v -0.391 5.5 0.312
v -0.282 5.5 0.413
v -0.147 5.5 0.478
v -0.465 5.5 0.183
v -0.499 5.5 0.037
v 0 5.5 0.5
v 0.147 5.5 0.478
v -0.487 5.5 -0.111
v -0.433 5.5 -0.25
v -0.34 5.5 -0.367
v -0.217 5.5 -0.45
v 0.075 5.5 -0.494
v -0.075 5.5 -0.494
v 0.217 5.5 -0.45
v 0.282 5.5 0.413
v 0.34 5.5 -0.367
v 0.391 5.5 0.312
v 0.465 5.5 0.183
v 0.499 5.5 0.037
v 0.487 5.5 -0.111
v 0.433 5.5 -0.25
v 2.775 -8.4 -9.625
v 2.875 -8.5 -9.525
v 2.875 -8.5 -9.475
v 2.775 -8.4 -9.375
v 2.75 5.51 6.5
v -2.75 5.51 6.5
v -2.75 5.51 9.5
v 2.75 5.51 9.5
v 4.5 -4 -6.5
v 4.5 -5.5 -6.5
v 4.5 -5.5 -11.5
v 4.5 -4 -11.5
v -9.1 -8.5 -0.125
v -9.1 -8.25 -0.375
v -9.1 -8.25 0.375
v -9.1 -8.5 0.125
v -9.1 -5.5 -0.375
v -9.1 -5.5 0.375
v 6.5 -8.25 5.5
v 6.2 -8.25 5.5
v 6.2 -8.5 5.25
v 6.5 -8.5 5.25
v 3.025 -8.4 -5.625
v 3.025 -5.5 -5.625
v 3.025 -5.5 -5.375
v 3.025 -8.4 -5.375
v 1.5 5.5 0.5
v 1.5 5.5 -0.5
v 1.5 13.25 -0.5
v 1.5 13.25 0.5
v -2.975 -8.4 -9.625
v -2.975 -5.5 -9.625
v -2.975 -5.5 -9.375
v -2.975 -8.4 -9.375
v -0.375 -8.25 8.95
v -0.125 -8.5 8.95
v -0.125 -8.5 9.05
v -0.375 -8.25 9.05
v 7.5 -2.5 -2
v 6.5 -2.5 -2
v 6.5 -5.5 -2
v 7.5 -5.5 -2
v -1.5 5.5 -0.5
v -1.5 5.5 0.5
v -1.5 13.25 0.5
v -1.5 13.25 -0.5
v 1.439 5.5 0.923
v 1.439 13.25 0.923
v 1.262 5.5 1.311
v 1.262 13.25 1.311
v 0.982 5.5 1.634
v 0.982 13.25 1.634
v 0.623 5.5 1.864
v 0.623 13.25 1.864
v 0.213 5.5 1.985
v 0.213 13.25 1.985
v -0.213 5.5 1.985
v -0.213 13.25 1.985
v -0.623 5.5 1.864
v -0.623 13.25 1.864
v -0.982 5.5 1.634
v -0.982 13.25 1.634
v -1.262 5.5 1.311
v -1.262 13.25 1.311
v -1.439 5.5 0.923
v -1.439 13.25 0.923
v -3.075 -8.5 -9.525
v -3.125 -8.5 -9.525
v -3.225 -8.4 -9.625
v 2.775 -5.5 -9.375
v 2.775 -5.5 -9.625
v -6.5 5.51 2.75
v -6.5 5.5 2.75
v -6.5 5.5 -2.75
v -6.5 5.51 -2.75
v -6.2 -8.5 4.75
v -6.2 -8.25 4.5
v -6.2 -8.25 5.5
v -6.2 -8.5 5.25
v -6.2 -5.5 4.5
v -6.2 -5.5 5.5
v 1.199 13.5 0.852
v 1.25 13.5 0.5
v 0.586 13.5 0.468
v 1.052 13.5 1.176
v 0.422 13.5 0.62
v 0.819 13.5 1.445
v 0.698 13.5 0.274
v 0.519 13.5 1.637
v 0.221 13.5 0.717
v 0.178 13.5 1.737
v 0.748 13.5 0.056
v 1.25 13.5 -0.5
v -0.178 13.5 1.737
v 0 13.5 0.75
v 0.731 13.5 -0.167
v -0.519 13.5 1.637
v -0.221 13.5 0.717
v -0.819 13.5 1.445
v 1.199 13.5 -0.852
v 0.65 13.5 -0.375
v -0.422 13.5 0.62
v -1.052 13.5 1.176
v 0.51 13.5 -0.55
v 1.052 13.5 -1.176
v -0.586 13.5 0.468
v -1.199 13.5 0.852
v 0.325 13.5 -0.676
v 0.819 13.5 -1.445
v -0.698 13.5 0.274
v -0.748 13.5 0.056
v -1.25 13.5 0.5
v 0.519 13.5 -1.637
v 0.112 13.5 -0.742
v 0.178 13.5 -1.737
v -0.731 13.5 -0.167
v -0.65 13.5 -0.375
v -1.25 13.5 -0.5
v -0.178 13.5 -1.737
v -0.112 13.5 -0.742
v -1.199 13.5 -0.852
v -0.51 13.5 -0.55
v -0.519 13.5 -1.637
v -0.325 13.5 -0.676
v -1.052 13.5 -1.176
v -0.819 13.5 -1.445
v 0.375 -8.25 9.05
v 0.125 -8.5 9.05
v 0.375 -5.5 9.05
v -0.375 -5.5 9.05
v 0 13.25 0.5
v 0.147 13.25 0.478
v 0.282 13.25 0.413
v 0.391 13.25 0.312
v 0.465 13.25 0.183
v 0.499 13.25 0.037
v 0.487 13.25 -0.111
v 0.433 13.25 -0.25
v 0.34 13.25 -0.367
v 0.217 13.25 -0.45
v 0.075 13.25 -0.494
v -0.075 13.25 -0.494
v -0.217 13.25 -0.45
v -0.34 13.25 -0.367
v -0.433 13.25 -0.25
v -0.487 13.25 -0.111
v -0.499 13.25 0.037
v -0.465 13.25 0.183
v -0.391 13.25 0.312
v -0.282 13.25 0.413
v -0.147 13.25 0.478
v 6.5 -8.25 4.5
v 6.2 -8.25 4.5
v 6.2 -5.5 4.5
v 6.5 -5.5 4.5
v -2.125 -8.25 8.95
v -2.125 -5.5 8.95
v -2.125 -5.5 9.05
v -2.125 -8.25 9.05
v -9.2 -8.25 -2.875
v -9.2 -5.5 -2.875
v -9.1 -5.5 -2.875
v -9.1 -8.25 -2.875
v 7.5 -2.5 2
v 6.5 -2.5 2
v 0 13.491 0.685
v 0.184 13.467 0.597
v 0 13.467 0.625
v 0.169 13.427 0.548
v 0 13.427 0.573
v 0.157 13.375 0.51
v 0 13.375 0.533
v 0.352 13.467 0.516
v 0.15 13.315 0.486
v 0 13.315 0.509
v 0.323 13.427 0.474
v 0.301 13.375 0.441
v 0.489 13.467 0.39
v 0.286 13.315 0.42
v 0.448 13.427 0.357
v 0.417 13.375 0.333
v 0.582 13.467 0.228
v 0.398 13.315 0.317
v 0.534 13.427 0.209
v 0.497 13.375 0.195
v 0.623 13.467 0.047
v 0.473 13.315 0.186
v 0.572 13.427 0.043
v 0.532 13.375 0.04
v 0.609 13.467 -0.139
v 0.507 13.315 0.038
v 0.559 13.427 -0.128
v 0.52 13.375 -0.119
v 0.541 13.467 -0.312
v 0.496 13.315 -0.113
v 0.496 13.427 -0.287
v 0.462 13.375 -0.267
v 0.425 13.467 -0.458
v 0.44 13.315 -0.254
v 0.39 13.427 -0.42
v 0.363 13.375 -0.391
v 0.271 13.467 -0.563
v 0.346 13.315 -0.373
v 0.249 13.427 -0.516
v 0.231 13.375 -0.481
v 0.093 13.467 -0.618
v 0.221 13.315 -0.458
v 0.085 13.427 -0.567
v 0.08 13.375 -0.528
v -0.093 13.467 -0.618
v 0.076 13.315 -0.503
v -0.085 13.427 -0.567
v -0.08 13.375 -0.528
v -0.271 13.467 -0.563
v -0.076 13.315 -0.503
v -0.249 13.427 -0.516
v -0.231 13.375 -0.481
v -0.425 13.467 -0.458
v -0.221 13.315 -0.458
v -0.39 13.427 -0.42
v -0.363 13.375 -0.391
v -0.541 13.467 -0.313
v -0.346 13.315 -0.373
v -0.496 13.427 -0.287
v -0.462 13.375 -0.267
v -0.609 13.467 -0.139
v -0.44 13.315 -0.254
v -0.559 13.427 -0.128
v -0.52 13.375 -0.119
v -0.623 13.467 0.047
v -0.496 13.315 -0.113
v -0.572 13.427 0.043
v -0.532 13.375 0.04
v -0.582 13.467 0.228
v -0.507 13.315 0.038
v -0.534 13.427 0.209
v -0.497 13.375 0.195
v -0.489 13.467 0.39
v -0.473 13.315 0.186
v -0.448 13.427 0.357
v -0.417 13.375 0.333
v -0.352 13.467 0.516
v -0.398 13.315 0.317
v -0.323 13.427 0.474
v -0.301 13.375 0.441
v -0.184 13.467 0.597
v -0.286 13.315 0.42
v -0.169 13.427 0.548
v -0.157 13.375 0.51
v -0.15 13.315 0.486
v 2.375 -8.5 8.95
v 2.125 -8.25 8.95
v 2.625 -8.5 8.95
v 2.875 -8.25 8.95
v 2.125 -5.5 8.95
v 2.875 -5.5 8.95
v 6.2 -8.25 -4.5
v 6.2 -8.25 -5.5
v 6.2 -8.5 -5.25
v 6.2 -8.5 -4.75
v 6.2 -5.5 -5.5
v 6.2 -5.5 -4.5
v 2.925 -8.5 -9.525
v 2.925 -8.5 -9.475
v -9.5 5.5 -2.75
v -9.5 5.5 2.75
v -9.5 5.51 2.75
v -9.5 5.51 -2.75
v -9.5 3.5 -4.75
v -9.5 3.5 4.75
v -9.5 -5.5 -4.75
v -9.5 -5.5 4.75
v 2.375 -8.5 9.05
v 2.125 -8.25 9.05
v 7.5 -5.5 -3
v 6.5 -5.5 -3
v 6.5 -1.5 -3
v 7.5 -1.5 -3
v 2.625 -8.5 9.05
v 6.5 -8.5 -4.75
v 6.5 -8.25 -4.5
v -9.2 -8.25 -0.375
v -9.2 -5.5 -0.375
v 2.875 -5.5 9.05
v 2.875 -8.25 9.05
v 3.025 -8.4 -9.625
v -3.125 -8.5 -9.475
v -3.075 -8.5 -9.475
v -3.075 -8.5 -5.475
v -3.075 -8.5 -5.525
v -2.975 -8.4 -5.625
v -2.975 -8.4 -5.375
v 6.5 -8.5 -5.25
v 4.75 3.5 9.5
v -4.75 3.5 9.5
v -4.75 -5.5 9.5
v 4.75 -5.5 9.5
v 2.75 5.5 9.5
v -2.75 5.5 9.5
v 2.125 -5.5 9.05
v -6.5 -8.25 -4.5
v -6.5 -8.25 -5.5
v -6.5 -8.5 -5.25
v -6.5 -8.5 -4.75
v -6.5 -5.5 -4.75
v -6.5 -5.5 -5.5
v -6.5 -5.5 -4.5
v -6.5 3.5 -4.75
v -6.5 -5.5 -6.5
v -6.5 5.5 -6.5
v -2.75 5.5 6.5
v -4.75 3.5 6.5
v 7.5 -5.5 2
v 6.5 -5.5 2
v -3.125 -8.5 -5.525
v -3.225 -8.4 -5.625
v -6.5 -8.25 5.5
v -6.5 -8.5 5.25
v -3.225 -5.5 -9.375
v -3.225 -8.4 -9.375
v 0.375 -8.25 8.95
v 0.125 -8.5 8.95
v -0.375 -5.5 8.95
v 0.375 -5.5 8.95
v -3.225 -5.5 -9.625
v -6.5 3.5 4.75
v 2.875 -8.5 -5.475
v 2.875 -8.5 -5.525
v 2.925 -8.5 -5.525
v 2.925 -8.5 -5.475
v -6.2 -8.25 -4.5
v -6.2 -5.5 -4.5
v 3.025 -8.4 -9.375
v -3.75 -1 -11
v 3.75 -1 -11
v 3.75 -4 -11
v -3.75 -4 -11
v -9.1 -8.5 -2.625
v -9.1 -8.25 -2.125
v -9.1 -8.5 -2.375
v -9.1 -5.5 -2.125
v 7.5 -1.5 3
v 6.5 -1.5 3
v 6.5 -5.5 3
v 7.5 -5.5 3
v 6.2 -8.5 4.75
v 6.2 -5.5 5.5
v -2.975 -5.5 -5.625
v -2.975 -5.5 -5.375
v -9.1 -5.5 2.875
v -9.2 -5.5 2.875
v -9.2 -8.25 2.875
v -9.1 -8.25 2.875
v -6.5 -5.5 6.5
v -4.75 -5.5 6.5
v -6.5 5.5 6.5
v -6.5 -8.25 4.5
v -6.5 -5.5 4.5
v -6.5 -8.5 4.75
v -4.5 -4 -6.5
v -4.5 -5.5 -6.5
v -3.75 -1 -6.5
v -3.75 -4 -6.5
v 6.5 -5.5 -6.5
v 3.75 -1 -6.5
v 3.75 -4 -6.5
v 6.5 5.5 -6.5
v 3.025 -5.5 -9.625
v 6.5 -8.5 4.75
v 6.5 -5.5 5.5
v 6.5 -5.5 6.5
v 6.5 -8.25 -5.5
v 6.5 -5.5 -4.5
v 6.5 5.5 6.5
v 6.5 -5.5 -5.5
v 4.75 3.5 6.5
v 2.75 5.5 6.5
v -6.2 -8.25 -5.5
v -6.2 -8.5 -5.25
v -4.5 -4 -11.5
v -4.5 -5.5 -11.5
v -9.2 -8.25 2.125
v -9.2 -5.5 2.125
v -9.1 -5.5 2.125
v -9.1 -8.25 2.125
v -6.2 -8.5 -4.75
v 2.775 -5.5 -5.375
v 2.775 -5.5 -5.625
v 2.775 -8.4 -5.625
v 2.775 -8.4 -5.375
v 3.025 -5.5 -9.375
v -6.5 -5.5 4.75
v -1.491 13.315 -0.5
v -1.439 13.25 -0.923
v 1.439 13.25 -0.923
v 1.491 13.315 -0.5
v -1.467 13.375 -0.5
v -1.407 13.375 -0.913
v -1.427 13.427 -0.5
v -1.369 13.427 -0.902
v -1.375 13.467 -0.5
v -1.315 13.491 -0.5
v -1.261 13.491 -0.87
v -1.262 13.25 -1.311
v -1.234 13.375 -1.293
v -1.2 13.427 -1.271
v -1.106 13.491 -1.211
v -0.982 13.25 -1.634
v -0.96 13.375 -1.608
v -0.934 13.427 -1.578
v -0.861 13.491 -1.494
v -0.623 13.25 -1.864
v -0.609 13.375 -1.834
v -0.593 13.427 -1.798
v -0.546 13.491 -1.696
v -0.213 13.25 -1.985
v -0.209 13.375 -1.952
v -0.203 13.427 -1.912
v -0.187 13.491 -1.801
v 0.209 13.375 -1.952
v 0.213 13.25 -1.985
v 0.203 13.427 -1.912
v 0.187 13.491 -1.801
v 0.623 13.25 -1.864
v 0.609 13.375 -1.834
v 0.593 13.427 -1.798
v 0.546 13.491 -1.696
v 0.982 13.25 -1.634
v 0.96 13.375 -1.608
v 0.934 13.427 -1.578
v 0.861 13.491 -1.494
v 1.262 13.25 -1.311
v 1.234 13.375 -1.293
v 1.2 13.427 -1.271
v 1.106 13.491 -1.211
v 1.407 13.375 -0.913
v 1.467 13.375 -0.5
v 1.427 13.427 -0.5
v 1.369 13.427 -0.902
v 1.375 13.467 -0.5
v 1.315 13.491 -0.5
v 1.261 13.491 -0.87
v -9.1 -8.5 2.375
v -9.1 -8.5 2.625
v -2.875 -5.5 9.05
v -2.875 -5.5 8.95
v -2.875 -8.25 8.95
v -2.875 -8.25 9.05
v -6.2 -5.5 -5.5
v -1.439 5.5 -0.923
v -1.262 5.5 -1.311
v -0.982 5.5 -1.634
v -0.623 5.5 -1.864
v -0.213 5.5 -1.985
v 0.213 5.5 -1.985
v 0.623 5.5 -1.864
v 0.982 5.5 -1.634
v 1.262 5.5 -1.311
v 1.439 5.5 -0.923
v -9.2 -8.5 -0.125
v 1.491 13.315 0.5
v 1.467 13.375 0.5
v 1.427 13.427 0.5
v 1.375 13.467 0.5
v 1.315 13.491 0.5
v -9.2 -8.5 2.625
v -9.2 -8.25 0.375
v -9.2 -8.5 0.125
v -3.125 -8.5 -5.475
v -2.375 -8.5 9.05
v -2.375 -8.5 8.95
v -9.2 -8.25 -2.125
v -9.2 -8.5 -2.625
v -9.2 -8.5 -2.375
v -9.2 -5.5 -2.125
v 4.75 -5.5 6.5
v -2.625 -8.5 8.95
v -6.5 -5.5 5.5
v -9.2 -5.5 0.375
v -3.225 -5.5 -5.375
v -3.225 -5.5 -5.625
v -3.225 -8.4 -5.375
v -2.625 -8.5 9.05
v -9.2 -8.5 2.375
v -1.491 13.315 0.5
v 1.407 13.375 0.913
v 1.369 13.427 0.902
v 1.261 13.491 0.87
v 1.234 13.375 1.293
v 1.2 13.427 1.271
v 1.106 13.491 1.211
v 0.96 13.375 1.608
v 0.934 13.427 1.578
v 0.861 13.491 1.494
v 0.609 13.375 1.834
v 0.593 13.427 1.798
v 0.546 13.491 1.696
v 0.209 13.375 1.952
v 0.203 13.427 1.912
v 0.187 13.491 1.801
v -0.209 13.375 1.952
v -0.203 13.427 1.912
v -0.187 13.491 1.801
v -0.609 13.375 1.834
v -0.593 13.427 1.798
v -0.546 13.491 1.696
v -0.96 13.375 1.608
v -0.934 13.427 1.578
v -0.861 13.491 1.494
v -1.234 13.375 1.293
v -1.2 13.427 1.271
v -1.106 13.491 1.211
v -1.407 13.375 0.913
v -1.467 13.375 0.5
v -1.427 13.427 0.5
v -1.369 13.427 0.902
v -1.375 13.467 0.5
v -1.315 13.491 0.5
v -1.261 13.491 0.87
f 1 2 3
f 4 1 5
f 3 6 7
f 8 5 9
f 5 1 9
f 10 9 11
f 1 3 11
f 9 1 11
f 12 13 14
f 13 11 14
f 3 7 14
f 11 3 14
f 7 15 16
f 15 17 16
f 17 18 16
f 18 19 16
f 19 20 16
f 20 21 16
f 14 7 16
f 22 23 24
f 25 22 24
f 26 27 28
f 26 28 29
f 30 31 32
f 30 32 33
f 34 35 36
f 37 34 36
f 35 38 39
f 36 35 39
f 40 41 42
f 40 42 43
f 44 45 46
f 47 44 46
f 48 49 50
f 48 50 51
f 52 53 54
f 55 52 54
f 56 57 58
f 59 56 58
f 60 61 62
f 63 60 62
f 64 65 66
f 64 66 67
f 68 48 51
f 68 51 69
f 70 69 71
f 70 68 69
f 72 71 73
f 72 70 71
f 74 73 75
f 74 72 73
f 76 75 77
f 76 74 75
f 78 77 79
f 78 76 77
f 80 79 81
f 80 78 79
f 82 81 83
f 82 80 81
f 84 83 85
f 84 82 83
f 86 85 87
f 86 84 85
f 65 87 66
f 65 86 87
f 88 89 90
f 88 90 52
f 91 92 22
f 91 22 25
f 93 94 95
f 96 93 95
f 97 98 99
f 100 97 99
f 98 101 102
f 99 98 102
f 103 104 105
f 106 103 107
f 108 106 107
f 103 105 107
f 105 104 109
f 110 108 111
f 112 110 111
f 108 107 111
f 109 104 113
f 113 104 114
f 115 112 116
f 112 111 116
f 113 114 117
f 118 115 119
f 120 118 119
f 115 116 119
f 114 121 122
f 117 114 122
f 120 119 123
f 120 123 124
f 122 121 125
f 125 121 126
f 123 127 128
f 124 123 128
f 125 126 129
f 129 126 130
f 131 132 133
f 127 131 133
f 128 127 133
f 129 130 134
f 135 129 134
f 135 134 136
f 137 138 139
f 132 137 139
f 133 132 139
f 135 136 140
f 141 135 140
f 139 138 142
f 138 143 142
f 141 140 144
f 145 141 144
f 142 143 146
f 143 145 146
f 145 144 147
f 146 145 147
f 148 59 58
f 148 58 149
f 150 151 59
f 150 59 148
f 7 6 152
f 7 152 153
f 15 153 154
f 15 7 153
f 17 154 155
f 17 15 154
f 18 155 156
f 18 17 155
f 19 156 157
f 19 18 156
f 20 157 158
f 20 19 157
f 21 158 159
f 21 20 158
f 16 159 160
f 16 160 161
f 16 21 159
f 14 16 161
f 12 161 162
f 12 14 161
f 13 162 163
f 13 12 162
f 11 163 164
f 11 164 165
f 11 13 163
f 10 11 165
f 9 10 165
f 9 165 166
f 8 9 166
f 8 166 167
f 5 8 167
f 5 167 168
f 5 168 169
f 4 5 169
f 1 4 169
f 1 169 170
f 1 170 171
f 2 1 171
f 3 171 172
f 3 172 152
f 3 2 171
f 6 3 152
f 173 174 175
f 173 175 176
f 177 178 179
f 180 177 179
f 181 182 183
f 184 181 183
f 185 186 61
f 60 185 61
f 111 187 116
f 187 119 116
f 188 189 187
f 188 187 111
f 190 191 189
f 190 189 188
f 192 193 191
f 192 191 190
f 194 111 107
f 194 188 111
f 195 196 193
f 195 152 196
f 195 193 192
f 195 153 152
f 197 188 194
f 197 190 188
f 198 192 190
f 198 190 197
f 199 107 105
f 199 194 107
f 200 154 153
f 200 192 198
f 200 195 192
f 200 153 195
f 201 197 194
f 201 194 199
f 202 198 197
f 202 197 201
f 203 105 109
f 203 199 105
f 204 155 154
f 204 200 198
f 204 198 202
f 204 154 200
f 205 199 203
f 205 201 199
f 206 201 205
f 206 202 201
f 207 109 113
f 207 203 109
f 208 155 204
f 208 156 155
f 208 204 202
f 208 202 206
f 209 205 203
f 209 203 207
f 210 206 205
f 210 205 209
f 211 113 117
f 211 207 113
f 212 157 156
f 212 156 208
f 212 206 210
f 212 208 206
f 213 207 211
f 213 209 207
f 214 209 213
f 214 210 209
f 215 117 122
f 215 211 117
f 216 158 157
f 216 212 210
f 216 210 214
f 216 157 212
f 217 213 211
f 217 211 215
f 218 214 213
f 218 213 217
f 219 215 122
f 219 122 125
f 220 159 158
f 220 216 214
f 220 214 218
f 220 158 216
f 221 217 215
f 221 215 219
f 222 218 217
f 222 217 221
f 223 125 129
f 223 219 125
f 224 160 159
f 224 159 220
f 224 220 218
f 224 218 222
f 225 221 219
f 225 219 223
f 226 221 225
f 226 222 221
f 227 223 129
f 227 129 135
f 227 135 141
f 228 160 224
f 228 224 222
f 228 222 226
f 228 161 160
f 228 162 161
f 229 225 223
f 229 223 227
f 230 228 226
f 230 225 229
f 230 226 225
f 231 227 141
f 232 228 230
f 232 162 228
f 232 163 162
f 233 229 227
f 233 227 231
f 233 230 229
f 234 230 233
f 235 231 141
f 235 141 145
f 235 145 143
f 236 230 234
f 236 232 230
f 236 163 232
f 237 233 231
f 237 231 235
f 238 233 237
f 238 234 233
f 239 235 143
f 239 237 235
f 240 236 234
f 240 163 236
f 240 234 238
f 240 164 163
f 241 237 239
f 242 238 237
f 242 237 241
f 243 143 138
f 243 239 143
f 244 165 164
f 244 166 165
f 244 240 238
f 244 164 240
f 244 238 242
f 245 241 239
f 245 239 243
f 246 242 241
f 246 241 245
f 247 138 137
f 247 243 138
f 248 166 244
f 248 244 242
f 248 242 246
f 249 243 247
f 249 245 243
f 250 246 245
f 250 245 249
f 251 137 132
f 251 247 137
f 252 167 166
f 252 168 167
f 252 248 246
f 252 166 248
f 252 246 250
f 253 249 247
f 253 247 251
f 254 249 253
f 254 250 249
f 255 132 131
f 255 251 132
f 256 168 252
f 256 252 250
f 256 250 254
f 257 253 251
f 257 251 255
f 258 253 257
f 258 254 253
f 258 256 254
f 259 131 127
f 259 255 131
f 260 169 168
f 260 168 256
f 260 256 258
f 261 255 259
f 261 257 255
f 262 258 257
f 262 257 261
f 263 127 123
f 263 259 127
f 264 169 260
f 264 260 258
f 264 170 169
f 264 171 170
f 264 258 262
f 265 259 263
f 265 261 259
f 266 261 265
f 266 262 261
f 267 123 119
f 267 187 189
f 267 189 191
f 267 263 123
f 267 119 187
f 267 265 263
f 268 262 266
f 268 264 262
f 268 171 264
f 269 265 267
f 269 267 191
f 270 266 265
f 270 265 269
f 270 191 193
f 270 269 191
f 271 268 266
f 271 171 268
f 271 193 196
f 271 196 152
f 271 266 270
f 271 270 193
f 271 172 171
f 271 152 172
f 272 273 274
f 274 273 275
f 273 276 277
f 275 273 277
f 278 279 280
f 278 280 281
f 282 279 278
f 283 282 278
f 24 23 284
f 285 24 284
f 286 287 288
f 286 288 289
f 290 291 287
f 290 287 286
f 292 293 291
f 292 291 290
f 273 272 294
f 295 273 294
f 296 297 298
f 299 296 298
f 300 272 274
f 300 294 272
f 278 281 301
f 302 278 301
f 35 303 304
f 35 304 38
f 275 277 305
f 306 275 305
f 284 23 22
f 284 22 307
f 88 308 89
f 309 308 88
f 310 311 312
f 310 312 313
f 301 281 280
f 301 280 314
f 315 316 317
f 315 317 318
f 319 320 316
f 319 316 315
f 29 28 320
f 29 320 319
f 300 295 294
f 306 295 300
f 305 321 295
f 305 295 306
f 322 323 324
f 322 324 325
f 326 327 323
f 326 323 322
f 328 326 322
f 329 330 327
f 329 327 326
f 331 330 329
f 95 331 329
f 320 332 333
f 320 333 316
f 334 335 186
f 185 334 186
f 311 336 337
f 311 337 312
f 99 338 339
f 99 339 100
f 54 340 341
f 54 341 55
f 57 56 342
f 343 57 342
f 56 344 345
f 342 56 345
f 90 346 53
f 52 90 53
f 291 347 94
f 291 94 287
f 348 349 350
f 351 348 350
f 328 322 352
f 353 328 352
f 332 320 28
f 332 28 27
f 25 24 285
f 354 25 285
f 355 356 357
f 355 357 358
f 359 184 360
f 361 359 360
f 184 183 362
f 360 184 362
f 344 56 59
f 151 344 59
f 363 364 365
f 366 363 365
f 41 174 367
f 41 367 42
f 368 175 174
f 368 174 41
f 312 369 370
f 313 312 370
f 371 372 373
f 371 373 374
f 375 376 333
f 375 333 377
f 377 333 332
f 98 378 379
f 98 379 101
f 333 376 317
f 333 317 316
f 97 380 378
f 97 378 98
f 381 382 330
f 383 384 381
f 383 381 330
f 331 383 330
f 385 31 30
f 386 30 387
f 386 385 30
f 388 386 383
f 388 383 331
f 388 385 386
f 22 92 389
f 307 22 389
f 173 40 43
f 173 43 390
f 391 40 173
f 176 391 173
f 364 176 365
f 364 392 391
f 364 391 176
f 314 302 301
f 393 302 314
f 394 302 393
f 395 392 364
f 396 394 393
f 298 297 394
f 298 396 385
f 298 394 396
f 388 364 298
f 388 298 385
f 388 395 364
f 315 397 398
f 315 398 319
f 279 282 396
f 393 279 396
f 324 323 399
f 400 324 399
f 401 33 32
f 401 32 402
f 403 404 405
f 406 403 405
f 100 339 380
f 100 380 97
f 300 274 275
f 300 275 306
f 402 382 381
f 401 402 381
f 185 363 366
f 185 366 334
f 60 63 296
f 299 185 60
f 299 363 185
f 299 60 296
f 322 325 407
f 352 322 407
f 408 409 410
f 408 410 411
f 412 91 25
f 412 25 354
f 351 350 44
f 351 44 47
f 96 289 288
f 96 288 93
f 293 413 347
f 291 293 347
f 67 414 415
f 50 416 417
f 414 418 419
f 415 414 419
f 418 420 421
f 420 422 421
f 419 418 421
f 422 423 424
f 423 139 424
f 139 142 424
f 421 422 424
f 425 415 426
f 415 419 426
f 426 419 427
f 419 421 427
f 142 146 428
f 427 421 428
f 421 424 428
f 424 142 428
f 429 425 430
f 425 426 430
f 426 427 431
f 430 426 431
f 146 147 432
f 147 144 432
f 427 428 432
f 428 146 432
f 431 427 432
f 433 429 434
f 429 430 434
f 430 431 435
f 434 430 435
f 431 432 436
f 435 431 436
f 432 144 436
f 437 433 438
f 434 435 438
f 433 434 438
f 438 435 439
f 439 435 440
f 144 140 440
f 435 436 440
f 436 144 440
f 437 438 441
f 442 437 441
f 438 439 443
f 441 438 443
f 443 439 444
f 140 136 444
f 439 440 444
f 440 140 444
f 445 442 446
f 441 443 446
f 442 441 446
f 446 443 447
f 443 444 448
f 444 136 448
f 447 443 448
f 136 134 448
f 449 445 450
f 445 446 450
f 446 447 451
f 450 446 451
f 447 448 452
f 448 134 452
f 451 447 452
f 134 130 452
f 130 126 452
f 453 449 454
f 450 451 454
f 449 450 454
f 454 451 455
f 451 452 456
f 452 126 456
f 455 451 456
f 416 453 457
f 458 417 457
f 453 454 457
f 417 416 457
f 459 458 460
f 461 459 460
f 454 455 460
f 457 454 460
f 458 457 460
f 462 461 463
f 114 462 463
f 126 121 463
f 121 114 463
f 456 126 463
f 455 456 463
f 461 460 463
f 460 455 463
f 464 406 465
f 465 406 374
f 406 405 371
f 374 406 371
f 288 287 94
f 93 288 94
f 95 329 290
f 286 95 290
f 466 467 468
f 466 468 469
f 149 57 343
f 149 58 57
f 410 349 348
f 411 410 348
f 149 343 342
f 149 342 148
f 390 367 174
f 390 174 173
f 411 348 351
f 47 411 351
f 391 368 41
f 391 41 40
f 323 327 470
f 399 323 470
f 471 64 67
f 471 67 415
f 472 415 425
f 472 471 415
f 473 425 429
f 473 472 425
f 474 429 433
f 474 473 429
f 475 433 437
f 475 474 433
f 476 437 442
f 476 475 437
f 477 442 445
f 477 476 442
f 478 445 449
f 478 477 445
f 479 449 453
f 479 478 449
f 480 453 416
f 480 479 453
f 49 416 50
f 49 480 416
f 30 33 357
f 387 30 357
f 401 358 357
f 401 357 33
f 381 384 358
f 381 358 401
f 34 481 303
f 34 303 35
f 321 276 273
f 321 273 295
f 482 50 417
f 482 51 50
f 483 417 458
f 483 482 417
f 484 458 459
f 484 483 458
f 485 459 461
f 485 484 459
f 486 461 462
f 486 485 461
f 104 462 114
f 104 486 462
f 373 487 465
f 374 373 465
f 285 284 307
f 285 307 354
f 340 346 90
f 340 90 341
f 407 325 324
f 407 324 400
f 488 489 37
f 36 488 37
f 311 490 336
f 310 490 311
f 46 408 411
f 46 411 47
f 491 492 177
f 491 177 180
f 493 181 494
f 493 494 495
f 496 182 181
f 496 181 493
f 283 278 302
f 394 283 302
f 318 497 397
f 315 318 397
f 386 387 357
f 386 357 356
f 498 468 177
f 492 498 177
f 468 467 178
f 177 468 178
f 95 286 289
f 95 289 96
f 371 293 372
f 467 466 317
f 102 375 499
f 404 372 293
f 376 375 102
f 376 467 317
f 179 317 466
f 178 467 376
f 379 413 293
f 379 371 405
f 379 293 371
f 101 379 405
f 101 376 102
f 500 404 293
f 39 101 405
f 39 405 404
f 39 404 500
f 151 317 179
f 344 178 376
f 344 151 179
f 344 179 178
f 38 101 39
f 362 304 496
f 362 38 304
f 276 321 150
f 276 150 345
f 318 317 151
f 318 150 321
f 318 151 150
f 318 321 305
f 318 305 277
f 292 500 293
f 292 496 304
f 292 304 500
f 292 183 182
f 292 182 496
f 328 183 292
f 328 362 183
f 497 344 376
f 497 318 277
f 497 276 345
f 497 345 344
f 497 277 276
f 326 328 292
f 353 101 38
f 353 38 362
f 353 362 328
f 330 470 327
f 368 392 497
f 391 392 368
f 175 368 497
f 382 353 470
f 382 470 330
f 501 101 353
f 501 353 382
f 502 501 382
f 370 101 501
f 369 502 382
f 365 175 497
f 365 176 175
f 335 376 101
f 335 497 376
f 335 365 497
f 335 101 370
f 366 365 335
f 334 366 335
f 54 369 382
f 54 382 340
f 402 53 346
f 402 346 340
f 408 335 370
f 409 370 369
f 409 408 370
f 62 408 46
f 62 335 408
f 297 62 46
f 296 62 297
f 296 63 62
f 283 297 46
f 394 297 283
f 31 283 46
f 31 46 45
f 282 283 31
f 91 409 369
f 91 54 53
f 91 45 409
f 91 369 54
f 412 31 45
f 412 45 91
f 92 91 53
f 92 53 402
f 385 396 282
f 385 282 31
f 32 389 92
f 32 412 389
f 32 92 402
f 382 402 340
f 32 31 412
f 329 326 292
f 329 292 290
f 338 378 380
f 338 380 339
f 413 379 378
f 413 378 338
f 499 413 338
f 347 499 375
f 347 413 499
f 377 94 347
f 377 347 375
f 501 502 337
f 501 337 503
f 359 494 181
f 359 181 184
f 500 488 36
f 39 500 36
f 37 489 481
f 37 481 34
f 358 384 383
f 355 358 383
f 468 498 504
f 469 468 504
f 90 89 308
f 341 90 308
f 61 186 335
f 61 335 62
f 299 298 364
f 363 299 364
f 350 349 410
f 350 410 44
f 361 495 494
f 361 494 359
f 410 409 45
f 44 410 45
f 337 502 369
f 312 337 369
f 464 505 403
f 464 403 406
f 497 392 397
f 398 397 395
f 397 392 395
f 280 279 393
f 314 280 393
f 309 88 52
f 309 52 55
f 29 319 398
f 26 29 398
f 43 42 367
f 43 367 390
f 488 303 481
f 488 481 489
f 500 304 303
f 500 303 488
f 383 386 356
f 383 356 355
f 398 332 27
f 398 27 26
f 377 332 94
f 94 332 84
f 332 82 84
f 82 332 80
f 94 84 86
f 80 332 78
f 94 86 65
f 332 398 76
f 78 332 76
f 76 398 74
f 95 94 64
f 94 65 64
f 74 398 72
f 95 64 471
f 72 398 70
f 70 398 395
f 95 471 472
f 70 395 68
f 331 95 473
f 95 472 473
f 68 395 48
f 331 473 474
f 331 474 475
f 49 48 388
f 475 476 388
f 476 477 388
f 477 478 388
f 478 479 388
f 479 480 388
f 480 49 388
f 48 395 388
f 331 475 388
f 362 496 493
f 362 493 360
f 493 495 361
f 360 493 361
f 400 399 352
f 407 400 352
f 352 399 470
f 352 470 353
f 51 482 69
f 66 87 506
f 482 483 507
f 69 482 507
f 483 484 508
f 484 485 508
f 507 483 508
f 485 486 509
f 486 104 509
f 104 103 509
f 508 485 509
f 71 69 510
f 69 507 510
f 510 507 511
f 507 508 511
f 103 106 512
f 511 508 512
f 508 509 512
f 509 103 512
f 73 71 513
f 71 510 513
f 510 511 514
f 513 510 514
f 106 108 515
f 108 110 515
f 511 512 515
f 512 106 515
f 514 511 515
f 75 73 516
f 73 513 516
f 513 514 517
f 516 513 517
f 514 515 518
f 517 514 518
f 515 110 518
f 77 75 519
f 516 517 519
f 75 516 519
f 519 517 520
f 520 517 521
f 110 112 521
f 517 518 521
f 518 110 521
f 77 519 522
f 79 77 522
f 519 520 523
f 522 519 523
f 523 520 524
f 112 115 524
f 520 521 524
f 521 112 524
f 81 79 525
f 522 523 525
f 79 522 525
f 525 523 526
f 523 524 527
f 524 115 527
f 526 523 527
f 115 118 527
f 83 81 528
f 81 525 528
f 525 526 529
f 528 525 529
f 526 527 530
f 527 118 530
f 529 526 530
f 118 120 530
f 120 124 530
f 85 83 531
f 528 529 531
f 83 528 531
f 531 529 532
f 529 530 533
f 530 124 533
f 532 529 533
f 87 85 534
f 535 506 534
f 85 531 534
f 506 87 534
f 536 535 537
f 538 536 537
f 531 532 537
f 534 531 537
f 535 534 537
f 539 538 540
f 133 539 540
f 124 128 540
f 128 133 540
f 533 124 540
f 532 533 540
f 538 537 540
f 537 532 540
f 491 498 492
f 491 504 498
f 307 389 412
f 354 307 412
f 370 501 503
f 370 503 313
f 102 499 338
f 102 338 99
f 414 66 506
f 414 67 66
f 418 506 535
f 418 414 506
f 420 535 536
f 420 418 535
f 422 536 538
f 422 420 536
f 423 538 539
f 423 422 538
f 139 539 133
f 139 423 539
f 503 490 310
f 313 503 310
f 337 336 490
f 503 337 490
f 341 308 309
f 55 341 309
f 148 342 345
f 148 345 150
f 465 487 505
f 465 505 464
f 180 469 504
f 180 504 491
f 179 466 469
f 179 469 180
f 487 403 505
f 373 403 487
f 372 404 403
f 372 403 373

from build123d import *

# Parameters (mm, degrees)
SKETCH2_W           = 13
SKETCH2_H           = 11
BOSS_EXTRUDE1_DEPTH = 6.5
BOSS_EXTRUDE2_DEPTH = 1
SKETCH4_W           = 9.5
SKETCH4_H           = 11
BOSS_EXTRUDE3_DEPTH = 3
CHAMFER1_SIZE       = 2
SKETCH5_W           = 9.5
SKETCH5_H           = 11
BOSS_EXTRUDE4_DEPTH = 3
CHAMFER2_SIZE       = 2
SKETCH6_W           = 9
SKETCH6_H           = 1.5
BOSS_EXTRUDE5_DEPTH = 5
SKETCH7_W           = 7.5
SKETCH7_H           = 3
BOSS_EXTRUDE6_DEPTH = 4.5
SKETCH8_R           = 0.5
BOSS_EXTRUDE7_DEPTH = 8
FILLET2_R           = 0.25
SKETCH9_W           = 3
SKETCH9_H           = 5.5
SKETCH9_W_2         = 5.5
SKETCH9_H_2         = 3
BOSS_EXTRUDE8_DEPTH = 0.01
SKETCH10_W          = 0.3
SKETCH10_H          = 1
SKETCH10_W_2        = 0.1
SKETCH10_H_2        = 0.75
SKETCH10_W_3        = 0.75
SKETCH10_H_3        = 0.1
SKETCH10_W_4        = 0.25
SKETCH10_H_4        = 0.25
BOSS_EXTRUDE9_DEPTH = 3
CHAMFER3_SIZE       = 0.25
CHAMFER4_SIZE       = 0.1


with BuildPart() as part:
    # Sketch2 → Boss-Extrude1 (new, symmetric)
    with BuildSketch(Plane(origin=(0, 0, 0), x_dir=(0, 0, -1), z_dir=(1, 0, 0))):
        Rectangle(SKETCH2_W, SKETCH2_H)
    extrude(amount=BOSS_EXTRUDE1_DEPTH, both=True)

    # Sketch3 → Boss-Extrude2 (add)
    with BuildSketch(Plane(origin=(6.5, 0, 0), x_dir=(0, 0, -1), z_dir=(1, 0, 0))):
        Polygon((3, -1.5), (-3, -1.5), (-3, -5.5), (-2, -5.5), (-2, -2.5), (2, -2.5), (2, -5.5), (3, -5.5), align=None)
    extrude(amount=BOSS_EXTRUDE2_DEPTH)

    # Sketch4 → Boss-Extrude3 (add)
    with BuildSketch(Plane.XY.offset(6.5)):
        Rectangle(SKETCH4_W, SKETCH4_H)
    extrude(amount=BOSS_EXTRUDE3_DEPTH)

    # Chamfer1
    chamfer1_edges = [part.edges().sort_by_distance(p)[0] for p in [
        (-4.75, 5.5, 8),
        (4.75, 5.5, 8),
    ]]
    chamfer(chamfer1_edges, length=CHAMFER1_SIZE)

    # Sketch5 → Boss-Extrude4 (add)
    with BuildSketch(Plane.ZY.offset(6.5)):
        Rectangle(SKETCH5_W, SKETCH5_H)
    extrude(amount=BOSS_EXTRUDE4_DEPTH)

    # Chamfer2
    chamfer2_edges = [part.edges().sort_by_distance(p)[0] for p in [
        (-8, 5.5, -4.75),
        (-8, 5.5, 4.75),
    ]]
    chamfer(chamfer2_edges, length=CHAMFER2_SIZE)

    # Sketch6 → Boss-Extrude5 (add)
    with BuildSketch(Plane(origin=(0, 0, -6.5), x_dir=(-1, 0, 0), z_dir=(0, 0, -1))):
        with Locations((0, -4.75)):
            Rectangle(SKETCH6_W, SKETCH6_H)
    extrude(amount=BOSS_EXTRUDE5_DEPTH)

    # Sketch7 → Boss-Extrude6 (add)
    with BuildSketch(Plane(origin=(0, 0, -6.5), x_dir=(-1, 0, 0), z_dir=(0, 0, -1))):
        with Locations((0, -2.5)):
            Rectangle(SKETCH7_W, SKETCH7_H)
    extrude(amount=BOSS_EXTRUDE6_DEPTH)

    # Sketch8 → Boss-Extrude7 (add)
    with BuildSketch(Plane(origin=(0, 5.5, 0), x_dir=(1, 0, 0), z_dir=(0, 1, 0))):
        with BuildLine():
            Line((1.5, 0.5), (1.5, -0.5))
            ThreePointArc((1.5, -0.5), (0, -2), (-1.5, -0.5))
            Line((-1.5, -0.5), (-1.5, 0.5))
            ThreePointArc((-1.5, 0.5), (0, 2), (1.5, 0.5))
        make_face()
        with Locations(Location((0, 0, 0), (0, 0, 270))):
            Circle(SKETCH8_R, mode=Mode.SUBTRACT)
    extrude(amount=BOSS_EXTRUDE7_DEPTH)

    # Fillet2
    fillet2_edges = [part.edges().sort_by_distance(p)[0] for p in [
        (0, 13.5, -2),
        (-1.5, 13.5, 0),
        (0, 13.5, 2),
        (1.5, 13.5, 0),
        (0, 13.5, -0.5),
    ]]
    fillet(fillet2_edges, radius=FILLET2_R)

    # Sketch9 → Boss-Extrude8 (add)
    with BuildSketch(Plane(origin=(0, 5.5, 0), x_dir=(1, 0, 0), z_dir=(0, 1, 0))):
        with Locations((-8, 0)):
            Rectangle(SKETCH9_W, SKETCH9_H)
        with Locations((0, -8)):
            Rectangle(SKETCH9_W_2, SKETCH9_H_2)
    extrude(amount=BOSS_EXTRUDE8_DEPTH)

    # Sketch10 → Boss-Extrude9 (add)
    with BuildSketch(Plane.XZ.offset(5.5)):
        with Locations((-6.35, -5)):
            Rectangle(SKETCH10_W, SKETCH10_H)
        with Locations((6.35, -5)):
            Rectangle(SKETCH10_W, SKETCH10_H)
        with Locations((-6.35, 5)):
            Rectangle(SKETCH10_W, SKETCH10_H)
        with Locations((6.35, 5)):
            Rectangle(SKETCH10_W, SKETCH10_H)
        with Locations((-9.15, 0)):
            Rectangle(SKETCH10_W_2, SKETCH10_H_2)
        with Locations((-9.15, -2.5)):
            Rectangle(SKETCH10_W_2, SKETCH10_H_2)
        with Locations((-9.15, 2.5)):
            Rectangle(SKETCH10_W_2, SKETCH10_H_2)
        with Locations((0, 9)):
            Rectangle(SKETCH10_W_3, SKETCH10_H_3)
        with Locations((-2.5, 9)):
            Rectangle(SKETCH10_W_3, SKETCH10_H_3)
        with Locations((2.5, 9)):
            Rectangle(SKETCH10_W_3, SKETCH10_H_3)
        with Locations((-3.1, -5.5)):
            Rectangle(SKETCH10_W_4, SKETCH10_H_4)
        with Locations((2.9, -5.5)):
            Rectangle(SKETCH10_W_4, SKETCH10_H_4)
        with Locations((2.9, -9.5)):
            Rectangle(SKETCH10_W_4, SKETCH10_H_4)
        with Locations((-3.1, -9.5)):
            Rectangle(SKETCH10_W_4, SKETCH10_H_4)
    extrude(amount=BOSS_EXTRUDE9_DEPTH)

    # Chamfer3
    chamfer3_edges = [part.edges().sort_by_distance(p)[0] for p in [
        (-6.35, -8.5, -5.5),
        (-6.35, -8.5, -4.5),
        (6.35, -8.5, -4.5),
        (6.35, -8.5, -5.5),
        (-6.35, -8.5, 4.5),
        (-6.35, -8.5, 5.5),
        (6.35, -8.5, 5.5),
        (6.35, -8.5, 4.5),
        (-9.15, -8.5, 0.375),
        (-9.15, -8.5, -0.375),
        (-9.15, -8.5, -2.125),
        (-9.15, -8.5, -2.875),
        (-9.15, -8.5, 2.875),
        (-9.15, -8.5, 2.125),
        (0.375, -8.5, 9),
        (-0.375, -8.5, 9),
        (-2.125, -8.5, 9),
        (-2.875, -8.5, 9),
        (2.875, -8.5, 9),
        (2.125, -8.5, 9),
    ]]
    chamfer(chamfer3_edges, length=CHAMFER3_SIZE)

    # Chamfer4
    chamfer4_edges = [part.edges().sort_by_distance(p)[0] for p in [
        (3.025, -8.5, -5.5),
        (2.9, -8.5, -5.375),
        (2.775, -8.5, -5.5),
        (2.9, -8.5, -5.625),
        (-2.975, -8.5, -5.5),
        (-3.1, -8.5, -5.375),
        (-3.225, -8.5, -5.5),
        (-3.1, -8.5, -5.625),
        (3.025, -8.5, -9.5),
        (2.9, -8.5, -9.375),
        (2.775, -8.5, -9.5),
        (2.9, -8.5, -9.625),
        (-2.975, -8.5, -9.5),
        (-3.1, -8.5, -9.375),
        (-3.225, -8.5, -9.5),
        (-3.1, -8.5, -9.625),
    ]]
    chamfer(chamfer4_edges, length=CHAMFER4_SIZE)


solid = part.part
